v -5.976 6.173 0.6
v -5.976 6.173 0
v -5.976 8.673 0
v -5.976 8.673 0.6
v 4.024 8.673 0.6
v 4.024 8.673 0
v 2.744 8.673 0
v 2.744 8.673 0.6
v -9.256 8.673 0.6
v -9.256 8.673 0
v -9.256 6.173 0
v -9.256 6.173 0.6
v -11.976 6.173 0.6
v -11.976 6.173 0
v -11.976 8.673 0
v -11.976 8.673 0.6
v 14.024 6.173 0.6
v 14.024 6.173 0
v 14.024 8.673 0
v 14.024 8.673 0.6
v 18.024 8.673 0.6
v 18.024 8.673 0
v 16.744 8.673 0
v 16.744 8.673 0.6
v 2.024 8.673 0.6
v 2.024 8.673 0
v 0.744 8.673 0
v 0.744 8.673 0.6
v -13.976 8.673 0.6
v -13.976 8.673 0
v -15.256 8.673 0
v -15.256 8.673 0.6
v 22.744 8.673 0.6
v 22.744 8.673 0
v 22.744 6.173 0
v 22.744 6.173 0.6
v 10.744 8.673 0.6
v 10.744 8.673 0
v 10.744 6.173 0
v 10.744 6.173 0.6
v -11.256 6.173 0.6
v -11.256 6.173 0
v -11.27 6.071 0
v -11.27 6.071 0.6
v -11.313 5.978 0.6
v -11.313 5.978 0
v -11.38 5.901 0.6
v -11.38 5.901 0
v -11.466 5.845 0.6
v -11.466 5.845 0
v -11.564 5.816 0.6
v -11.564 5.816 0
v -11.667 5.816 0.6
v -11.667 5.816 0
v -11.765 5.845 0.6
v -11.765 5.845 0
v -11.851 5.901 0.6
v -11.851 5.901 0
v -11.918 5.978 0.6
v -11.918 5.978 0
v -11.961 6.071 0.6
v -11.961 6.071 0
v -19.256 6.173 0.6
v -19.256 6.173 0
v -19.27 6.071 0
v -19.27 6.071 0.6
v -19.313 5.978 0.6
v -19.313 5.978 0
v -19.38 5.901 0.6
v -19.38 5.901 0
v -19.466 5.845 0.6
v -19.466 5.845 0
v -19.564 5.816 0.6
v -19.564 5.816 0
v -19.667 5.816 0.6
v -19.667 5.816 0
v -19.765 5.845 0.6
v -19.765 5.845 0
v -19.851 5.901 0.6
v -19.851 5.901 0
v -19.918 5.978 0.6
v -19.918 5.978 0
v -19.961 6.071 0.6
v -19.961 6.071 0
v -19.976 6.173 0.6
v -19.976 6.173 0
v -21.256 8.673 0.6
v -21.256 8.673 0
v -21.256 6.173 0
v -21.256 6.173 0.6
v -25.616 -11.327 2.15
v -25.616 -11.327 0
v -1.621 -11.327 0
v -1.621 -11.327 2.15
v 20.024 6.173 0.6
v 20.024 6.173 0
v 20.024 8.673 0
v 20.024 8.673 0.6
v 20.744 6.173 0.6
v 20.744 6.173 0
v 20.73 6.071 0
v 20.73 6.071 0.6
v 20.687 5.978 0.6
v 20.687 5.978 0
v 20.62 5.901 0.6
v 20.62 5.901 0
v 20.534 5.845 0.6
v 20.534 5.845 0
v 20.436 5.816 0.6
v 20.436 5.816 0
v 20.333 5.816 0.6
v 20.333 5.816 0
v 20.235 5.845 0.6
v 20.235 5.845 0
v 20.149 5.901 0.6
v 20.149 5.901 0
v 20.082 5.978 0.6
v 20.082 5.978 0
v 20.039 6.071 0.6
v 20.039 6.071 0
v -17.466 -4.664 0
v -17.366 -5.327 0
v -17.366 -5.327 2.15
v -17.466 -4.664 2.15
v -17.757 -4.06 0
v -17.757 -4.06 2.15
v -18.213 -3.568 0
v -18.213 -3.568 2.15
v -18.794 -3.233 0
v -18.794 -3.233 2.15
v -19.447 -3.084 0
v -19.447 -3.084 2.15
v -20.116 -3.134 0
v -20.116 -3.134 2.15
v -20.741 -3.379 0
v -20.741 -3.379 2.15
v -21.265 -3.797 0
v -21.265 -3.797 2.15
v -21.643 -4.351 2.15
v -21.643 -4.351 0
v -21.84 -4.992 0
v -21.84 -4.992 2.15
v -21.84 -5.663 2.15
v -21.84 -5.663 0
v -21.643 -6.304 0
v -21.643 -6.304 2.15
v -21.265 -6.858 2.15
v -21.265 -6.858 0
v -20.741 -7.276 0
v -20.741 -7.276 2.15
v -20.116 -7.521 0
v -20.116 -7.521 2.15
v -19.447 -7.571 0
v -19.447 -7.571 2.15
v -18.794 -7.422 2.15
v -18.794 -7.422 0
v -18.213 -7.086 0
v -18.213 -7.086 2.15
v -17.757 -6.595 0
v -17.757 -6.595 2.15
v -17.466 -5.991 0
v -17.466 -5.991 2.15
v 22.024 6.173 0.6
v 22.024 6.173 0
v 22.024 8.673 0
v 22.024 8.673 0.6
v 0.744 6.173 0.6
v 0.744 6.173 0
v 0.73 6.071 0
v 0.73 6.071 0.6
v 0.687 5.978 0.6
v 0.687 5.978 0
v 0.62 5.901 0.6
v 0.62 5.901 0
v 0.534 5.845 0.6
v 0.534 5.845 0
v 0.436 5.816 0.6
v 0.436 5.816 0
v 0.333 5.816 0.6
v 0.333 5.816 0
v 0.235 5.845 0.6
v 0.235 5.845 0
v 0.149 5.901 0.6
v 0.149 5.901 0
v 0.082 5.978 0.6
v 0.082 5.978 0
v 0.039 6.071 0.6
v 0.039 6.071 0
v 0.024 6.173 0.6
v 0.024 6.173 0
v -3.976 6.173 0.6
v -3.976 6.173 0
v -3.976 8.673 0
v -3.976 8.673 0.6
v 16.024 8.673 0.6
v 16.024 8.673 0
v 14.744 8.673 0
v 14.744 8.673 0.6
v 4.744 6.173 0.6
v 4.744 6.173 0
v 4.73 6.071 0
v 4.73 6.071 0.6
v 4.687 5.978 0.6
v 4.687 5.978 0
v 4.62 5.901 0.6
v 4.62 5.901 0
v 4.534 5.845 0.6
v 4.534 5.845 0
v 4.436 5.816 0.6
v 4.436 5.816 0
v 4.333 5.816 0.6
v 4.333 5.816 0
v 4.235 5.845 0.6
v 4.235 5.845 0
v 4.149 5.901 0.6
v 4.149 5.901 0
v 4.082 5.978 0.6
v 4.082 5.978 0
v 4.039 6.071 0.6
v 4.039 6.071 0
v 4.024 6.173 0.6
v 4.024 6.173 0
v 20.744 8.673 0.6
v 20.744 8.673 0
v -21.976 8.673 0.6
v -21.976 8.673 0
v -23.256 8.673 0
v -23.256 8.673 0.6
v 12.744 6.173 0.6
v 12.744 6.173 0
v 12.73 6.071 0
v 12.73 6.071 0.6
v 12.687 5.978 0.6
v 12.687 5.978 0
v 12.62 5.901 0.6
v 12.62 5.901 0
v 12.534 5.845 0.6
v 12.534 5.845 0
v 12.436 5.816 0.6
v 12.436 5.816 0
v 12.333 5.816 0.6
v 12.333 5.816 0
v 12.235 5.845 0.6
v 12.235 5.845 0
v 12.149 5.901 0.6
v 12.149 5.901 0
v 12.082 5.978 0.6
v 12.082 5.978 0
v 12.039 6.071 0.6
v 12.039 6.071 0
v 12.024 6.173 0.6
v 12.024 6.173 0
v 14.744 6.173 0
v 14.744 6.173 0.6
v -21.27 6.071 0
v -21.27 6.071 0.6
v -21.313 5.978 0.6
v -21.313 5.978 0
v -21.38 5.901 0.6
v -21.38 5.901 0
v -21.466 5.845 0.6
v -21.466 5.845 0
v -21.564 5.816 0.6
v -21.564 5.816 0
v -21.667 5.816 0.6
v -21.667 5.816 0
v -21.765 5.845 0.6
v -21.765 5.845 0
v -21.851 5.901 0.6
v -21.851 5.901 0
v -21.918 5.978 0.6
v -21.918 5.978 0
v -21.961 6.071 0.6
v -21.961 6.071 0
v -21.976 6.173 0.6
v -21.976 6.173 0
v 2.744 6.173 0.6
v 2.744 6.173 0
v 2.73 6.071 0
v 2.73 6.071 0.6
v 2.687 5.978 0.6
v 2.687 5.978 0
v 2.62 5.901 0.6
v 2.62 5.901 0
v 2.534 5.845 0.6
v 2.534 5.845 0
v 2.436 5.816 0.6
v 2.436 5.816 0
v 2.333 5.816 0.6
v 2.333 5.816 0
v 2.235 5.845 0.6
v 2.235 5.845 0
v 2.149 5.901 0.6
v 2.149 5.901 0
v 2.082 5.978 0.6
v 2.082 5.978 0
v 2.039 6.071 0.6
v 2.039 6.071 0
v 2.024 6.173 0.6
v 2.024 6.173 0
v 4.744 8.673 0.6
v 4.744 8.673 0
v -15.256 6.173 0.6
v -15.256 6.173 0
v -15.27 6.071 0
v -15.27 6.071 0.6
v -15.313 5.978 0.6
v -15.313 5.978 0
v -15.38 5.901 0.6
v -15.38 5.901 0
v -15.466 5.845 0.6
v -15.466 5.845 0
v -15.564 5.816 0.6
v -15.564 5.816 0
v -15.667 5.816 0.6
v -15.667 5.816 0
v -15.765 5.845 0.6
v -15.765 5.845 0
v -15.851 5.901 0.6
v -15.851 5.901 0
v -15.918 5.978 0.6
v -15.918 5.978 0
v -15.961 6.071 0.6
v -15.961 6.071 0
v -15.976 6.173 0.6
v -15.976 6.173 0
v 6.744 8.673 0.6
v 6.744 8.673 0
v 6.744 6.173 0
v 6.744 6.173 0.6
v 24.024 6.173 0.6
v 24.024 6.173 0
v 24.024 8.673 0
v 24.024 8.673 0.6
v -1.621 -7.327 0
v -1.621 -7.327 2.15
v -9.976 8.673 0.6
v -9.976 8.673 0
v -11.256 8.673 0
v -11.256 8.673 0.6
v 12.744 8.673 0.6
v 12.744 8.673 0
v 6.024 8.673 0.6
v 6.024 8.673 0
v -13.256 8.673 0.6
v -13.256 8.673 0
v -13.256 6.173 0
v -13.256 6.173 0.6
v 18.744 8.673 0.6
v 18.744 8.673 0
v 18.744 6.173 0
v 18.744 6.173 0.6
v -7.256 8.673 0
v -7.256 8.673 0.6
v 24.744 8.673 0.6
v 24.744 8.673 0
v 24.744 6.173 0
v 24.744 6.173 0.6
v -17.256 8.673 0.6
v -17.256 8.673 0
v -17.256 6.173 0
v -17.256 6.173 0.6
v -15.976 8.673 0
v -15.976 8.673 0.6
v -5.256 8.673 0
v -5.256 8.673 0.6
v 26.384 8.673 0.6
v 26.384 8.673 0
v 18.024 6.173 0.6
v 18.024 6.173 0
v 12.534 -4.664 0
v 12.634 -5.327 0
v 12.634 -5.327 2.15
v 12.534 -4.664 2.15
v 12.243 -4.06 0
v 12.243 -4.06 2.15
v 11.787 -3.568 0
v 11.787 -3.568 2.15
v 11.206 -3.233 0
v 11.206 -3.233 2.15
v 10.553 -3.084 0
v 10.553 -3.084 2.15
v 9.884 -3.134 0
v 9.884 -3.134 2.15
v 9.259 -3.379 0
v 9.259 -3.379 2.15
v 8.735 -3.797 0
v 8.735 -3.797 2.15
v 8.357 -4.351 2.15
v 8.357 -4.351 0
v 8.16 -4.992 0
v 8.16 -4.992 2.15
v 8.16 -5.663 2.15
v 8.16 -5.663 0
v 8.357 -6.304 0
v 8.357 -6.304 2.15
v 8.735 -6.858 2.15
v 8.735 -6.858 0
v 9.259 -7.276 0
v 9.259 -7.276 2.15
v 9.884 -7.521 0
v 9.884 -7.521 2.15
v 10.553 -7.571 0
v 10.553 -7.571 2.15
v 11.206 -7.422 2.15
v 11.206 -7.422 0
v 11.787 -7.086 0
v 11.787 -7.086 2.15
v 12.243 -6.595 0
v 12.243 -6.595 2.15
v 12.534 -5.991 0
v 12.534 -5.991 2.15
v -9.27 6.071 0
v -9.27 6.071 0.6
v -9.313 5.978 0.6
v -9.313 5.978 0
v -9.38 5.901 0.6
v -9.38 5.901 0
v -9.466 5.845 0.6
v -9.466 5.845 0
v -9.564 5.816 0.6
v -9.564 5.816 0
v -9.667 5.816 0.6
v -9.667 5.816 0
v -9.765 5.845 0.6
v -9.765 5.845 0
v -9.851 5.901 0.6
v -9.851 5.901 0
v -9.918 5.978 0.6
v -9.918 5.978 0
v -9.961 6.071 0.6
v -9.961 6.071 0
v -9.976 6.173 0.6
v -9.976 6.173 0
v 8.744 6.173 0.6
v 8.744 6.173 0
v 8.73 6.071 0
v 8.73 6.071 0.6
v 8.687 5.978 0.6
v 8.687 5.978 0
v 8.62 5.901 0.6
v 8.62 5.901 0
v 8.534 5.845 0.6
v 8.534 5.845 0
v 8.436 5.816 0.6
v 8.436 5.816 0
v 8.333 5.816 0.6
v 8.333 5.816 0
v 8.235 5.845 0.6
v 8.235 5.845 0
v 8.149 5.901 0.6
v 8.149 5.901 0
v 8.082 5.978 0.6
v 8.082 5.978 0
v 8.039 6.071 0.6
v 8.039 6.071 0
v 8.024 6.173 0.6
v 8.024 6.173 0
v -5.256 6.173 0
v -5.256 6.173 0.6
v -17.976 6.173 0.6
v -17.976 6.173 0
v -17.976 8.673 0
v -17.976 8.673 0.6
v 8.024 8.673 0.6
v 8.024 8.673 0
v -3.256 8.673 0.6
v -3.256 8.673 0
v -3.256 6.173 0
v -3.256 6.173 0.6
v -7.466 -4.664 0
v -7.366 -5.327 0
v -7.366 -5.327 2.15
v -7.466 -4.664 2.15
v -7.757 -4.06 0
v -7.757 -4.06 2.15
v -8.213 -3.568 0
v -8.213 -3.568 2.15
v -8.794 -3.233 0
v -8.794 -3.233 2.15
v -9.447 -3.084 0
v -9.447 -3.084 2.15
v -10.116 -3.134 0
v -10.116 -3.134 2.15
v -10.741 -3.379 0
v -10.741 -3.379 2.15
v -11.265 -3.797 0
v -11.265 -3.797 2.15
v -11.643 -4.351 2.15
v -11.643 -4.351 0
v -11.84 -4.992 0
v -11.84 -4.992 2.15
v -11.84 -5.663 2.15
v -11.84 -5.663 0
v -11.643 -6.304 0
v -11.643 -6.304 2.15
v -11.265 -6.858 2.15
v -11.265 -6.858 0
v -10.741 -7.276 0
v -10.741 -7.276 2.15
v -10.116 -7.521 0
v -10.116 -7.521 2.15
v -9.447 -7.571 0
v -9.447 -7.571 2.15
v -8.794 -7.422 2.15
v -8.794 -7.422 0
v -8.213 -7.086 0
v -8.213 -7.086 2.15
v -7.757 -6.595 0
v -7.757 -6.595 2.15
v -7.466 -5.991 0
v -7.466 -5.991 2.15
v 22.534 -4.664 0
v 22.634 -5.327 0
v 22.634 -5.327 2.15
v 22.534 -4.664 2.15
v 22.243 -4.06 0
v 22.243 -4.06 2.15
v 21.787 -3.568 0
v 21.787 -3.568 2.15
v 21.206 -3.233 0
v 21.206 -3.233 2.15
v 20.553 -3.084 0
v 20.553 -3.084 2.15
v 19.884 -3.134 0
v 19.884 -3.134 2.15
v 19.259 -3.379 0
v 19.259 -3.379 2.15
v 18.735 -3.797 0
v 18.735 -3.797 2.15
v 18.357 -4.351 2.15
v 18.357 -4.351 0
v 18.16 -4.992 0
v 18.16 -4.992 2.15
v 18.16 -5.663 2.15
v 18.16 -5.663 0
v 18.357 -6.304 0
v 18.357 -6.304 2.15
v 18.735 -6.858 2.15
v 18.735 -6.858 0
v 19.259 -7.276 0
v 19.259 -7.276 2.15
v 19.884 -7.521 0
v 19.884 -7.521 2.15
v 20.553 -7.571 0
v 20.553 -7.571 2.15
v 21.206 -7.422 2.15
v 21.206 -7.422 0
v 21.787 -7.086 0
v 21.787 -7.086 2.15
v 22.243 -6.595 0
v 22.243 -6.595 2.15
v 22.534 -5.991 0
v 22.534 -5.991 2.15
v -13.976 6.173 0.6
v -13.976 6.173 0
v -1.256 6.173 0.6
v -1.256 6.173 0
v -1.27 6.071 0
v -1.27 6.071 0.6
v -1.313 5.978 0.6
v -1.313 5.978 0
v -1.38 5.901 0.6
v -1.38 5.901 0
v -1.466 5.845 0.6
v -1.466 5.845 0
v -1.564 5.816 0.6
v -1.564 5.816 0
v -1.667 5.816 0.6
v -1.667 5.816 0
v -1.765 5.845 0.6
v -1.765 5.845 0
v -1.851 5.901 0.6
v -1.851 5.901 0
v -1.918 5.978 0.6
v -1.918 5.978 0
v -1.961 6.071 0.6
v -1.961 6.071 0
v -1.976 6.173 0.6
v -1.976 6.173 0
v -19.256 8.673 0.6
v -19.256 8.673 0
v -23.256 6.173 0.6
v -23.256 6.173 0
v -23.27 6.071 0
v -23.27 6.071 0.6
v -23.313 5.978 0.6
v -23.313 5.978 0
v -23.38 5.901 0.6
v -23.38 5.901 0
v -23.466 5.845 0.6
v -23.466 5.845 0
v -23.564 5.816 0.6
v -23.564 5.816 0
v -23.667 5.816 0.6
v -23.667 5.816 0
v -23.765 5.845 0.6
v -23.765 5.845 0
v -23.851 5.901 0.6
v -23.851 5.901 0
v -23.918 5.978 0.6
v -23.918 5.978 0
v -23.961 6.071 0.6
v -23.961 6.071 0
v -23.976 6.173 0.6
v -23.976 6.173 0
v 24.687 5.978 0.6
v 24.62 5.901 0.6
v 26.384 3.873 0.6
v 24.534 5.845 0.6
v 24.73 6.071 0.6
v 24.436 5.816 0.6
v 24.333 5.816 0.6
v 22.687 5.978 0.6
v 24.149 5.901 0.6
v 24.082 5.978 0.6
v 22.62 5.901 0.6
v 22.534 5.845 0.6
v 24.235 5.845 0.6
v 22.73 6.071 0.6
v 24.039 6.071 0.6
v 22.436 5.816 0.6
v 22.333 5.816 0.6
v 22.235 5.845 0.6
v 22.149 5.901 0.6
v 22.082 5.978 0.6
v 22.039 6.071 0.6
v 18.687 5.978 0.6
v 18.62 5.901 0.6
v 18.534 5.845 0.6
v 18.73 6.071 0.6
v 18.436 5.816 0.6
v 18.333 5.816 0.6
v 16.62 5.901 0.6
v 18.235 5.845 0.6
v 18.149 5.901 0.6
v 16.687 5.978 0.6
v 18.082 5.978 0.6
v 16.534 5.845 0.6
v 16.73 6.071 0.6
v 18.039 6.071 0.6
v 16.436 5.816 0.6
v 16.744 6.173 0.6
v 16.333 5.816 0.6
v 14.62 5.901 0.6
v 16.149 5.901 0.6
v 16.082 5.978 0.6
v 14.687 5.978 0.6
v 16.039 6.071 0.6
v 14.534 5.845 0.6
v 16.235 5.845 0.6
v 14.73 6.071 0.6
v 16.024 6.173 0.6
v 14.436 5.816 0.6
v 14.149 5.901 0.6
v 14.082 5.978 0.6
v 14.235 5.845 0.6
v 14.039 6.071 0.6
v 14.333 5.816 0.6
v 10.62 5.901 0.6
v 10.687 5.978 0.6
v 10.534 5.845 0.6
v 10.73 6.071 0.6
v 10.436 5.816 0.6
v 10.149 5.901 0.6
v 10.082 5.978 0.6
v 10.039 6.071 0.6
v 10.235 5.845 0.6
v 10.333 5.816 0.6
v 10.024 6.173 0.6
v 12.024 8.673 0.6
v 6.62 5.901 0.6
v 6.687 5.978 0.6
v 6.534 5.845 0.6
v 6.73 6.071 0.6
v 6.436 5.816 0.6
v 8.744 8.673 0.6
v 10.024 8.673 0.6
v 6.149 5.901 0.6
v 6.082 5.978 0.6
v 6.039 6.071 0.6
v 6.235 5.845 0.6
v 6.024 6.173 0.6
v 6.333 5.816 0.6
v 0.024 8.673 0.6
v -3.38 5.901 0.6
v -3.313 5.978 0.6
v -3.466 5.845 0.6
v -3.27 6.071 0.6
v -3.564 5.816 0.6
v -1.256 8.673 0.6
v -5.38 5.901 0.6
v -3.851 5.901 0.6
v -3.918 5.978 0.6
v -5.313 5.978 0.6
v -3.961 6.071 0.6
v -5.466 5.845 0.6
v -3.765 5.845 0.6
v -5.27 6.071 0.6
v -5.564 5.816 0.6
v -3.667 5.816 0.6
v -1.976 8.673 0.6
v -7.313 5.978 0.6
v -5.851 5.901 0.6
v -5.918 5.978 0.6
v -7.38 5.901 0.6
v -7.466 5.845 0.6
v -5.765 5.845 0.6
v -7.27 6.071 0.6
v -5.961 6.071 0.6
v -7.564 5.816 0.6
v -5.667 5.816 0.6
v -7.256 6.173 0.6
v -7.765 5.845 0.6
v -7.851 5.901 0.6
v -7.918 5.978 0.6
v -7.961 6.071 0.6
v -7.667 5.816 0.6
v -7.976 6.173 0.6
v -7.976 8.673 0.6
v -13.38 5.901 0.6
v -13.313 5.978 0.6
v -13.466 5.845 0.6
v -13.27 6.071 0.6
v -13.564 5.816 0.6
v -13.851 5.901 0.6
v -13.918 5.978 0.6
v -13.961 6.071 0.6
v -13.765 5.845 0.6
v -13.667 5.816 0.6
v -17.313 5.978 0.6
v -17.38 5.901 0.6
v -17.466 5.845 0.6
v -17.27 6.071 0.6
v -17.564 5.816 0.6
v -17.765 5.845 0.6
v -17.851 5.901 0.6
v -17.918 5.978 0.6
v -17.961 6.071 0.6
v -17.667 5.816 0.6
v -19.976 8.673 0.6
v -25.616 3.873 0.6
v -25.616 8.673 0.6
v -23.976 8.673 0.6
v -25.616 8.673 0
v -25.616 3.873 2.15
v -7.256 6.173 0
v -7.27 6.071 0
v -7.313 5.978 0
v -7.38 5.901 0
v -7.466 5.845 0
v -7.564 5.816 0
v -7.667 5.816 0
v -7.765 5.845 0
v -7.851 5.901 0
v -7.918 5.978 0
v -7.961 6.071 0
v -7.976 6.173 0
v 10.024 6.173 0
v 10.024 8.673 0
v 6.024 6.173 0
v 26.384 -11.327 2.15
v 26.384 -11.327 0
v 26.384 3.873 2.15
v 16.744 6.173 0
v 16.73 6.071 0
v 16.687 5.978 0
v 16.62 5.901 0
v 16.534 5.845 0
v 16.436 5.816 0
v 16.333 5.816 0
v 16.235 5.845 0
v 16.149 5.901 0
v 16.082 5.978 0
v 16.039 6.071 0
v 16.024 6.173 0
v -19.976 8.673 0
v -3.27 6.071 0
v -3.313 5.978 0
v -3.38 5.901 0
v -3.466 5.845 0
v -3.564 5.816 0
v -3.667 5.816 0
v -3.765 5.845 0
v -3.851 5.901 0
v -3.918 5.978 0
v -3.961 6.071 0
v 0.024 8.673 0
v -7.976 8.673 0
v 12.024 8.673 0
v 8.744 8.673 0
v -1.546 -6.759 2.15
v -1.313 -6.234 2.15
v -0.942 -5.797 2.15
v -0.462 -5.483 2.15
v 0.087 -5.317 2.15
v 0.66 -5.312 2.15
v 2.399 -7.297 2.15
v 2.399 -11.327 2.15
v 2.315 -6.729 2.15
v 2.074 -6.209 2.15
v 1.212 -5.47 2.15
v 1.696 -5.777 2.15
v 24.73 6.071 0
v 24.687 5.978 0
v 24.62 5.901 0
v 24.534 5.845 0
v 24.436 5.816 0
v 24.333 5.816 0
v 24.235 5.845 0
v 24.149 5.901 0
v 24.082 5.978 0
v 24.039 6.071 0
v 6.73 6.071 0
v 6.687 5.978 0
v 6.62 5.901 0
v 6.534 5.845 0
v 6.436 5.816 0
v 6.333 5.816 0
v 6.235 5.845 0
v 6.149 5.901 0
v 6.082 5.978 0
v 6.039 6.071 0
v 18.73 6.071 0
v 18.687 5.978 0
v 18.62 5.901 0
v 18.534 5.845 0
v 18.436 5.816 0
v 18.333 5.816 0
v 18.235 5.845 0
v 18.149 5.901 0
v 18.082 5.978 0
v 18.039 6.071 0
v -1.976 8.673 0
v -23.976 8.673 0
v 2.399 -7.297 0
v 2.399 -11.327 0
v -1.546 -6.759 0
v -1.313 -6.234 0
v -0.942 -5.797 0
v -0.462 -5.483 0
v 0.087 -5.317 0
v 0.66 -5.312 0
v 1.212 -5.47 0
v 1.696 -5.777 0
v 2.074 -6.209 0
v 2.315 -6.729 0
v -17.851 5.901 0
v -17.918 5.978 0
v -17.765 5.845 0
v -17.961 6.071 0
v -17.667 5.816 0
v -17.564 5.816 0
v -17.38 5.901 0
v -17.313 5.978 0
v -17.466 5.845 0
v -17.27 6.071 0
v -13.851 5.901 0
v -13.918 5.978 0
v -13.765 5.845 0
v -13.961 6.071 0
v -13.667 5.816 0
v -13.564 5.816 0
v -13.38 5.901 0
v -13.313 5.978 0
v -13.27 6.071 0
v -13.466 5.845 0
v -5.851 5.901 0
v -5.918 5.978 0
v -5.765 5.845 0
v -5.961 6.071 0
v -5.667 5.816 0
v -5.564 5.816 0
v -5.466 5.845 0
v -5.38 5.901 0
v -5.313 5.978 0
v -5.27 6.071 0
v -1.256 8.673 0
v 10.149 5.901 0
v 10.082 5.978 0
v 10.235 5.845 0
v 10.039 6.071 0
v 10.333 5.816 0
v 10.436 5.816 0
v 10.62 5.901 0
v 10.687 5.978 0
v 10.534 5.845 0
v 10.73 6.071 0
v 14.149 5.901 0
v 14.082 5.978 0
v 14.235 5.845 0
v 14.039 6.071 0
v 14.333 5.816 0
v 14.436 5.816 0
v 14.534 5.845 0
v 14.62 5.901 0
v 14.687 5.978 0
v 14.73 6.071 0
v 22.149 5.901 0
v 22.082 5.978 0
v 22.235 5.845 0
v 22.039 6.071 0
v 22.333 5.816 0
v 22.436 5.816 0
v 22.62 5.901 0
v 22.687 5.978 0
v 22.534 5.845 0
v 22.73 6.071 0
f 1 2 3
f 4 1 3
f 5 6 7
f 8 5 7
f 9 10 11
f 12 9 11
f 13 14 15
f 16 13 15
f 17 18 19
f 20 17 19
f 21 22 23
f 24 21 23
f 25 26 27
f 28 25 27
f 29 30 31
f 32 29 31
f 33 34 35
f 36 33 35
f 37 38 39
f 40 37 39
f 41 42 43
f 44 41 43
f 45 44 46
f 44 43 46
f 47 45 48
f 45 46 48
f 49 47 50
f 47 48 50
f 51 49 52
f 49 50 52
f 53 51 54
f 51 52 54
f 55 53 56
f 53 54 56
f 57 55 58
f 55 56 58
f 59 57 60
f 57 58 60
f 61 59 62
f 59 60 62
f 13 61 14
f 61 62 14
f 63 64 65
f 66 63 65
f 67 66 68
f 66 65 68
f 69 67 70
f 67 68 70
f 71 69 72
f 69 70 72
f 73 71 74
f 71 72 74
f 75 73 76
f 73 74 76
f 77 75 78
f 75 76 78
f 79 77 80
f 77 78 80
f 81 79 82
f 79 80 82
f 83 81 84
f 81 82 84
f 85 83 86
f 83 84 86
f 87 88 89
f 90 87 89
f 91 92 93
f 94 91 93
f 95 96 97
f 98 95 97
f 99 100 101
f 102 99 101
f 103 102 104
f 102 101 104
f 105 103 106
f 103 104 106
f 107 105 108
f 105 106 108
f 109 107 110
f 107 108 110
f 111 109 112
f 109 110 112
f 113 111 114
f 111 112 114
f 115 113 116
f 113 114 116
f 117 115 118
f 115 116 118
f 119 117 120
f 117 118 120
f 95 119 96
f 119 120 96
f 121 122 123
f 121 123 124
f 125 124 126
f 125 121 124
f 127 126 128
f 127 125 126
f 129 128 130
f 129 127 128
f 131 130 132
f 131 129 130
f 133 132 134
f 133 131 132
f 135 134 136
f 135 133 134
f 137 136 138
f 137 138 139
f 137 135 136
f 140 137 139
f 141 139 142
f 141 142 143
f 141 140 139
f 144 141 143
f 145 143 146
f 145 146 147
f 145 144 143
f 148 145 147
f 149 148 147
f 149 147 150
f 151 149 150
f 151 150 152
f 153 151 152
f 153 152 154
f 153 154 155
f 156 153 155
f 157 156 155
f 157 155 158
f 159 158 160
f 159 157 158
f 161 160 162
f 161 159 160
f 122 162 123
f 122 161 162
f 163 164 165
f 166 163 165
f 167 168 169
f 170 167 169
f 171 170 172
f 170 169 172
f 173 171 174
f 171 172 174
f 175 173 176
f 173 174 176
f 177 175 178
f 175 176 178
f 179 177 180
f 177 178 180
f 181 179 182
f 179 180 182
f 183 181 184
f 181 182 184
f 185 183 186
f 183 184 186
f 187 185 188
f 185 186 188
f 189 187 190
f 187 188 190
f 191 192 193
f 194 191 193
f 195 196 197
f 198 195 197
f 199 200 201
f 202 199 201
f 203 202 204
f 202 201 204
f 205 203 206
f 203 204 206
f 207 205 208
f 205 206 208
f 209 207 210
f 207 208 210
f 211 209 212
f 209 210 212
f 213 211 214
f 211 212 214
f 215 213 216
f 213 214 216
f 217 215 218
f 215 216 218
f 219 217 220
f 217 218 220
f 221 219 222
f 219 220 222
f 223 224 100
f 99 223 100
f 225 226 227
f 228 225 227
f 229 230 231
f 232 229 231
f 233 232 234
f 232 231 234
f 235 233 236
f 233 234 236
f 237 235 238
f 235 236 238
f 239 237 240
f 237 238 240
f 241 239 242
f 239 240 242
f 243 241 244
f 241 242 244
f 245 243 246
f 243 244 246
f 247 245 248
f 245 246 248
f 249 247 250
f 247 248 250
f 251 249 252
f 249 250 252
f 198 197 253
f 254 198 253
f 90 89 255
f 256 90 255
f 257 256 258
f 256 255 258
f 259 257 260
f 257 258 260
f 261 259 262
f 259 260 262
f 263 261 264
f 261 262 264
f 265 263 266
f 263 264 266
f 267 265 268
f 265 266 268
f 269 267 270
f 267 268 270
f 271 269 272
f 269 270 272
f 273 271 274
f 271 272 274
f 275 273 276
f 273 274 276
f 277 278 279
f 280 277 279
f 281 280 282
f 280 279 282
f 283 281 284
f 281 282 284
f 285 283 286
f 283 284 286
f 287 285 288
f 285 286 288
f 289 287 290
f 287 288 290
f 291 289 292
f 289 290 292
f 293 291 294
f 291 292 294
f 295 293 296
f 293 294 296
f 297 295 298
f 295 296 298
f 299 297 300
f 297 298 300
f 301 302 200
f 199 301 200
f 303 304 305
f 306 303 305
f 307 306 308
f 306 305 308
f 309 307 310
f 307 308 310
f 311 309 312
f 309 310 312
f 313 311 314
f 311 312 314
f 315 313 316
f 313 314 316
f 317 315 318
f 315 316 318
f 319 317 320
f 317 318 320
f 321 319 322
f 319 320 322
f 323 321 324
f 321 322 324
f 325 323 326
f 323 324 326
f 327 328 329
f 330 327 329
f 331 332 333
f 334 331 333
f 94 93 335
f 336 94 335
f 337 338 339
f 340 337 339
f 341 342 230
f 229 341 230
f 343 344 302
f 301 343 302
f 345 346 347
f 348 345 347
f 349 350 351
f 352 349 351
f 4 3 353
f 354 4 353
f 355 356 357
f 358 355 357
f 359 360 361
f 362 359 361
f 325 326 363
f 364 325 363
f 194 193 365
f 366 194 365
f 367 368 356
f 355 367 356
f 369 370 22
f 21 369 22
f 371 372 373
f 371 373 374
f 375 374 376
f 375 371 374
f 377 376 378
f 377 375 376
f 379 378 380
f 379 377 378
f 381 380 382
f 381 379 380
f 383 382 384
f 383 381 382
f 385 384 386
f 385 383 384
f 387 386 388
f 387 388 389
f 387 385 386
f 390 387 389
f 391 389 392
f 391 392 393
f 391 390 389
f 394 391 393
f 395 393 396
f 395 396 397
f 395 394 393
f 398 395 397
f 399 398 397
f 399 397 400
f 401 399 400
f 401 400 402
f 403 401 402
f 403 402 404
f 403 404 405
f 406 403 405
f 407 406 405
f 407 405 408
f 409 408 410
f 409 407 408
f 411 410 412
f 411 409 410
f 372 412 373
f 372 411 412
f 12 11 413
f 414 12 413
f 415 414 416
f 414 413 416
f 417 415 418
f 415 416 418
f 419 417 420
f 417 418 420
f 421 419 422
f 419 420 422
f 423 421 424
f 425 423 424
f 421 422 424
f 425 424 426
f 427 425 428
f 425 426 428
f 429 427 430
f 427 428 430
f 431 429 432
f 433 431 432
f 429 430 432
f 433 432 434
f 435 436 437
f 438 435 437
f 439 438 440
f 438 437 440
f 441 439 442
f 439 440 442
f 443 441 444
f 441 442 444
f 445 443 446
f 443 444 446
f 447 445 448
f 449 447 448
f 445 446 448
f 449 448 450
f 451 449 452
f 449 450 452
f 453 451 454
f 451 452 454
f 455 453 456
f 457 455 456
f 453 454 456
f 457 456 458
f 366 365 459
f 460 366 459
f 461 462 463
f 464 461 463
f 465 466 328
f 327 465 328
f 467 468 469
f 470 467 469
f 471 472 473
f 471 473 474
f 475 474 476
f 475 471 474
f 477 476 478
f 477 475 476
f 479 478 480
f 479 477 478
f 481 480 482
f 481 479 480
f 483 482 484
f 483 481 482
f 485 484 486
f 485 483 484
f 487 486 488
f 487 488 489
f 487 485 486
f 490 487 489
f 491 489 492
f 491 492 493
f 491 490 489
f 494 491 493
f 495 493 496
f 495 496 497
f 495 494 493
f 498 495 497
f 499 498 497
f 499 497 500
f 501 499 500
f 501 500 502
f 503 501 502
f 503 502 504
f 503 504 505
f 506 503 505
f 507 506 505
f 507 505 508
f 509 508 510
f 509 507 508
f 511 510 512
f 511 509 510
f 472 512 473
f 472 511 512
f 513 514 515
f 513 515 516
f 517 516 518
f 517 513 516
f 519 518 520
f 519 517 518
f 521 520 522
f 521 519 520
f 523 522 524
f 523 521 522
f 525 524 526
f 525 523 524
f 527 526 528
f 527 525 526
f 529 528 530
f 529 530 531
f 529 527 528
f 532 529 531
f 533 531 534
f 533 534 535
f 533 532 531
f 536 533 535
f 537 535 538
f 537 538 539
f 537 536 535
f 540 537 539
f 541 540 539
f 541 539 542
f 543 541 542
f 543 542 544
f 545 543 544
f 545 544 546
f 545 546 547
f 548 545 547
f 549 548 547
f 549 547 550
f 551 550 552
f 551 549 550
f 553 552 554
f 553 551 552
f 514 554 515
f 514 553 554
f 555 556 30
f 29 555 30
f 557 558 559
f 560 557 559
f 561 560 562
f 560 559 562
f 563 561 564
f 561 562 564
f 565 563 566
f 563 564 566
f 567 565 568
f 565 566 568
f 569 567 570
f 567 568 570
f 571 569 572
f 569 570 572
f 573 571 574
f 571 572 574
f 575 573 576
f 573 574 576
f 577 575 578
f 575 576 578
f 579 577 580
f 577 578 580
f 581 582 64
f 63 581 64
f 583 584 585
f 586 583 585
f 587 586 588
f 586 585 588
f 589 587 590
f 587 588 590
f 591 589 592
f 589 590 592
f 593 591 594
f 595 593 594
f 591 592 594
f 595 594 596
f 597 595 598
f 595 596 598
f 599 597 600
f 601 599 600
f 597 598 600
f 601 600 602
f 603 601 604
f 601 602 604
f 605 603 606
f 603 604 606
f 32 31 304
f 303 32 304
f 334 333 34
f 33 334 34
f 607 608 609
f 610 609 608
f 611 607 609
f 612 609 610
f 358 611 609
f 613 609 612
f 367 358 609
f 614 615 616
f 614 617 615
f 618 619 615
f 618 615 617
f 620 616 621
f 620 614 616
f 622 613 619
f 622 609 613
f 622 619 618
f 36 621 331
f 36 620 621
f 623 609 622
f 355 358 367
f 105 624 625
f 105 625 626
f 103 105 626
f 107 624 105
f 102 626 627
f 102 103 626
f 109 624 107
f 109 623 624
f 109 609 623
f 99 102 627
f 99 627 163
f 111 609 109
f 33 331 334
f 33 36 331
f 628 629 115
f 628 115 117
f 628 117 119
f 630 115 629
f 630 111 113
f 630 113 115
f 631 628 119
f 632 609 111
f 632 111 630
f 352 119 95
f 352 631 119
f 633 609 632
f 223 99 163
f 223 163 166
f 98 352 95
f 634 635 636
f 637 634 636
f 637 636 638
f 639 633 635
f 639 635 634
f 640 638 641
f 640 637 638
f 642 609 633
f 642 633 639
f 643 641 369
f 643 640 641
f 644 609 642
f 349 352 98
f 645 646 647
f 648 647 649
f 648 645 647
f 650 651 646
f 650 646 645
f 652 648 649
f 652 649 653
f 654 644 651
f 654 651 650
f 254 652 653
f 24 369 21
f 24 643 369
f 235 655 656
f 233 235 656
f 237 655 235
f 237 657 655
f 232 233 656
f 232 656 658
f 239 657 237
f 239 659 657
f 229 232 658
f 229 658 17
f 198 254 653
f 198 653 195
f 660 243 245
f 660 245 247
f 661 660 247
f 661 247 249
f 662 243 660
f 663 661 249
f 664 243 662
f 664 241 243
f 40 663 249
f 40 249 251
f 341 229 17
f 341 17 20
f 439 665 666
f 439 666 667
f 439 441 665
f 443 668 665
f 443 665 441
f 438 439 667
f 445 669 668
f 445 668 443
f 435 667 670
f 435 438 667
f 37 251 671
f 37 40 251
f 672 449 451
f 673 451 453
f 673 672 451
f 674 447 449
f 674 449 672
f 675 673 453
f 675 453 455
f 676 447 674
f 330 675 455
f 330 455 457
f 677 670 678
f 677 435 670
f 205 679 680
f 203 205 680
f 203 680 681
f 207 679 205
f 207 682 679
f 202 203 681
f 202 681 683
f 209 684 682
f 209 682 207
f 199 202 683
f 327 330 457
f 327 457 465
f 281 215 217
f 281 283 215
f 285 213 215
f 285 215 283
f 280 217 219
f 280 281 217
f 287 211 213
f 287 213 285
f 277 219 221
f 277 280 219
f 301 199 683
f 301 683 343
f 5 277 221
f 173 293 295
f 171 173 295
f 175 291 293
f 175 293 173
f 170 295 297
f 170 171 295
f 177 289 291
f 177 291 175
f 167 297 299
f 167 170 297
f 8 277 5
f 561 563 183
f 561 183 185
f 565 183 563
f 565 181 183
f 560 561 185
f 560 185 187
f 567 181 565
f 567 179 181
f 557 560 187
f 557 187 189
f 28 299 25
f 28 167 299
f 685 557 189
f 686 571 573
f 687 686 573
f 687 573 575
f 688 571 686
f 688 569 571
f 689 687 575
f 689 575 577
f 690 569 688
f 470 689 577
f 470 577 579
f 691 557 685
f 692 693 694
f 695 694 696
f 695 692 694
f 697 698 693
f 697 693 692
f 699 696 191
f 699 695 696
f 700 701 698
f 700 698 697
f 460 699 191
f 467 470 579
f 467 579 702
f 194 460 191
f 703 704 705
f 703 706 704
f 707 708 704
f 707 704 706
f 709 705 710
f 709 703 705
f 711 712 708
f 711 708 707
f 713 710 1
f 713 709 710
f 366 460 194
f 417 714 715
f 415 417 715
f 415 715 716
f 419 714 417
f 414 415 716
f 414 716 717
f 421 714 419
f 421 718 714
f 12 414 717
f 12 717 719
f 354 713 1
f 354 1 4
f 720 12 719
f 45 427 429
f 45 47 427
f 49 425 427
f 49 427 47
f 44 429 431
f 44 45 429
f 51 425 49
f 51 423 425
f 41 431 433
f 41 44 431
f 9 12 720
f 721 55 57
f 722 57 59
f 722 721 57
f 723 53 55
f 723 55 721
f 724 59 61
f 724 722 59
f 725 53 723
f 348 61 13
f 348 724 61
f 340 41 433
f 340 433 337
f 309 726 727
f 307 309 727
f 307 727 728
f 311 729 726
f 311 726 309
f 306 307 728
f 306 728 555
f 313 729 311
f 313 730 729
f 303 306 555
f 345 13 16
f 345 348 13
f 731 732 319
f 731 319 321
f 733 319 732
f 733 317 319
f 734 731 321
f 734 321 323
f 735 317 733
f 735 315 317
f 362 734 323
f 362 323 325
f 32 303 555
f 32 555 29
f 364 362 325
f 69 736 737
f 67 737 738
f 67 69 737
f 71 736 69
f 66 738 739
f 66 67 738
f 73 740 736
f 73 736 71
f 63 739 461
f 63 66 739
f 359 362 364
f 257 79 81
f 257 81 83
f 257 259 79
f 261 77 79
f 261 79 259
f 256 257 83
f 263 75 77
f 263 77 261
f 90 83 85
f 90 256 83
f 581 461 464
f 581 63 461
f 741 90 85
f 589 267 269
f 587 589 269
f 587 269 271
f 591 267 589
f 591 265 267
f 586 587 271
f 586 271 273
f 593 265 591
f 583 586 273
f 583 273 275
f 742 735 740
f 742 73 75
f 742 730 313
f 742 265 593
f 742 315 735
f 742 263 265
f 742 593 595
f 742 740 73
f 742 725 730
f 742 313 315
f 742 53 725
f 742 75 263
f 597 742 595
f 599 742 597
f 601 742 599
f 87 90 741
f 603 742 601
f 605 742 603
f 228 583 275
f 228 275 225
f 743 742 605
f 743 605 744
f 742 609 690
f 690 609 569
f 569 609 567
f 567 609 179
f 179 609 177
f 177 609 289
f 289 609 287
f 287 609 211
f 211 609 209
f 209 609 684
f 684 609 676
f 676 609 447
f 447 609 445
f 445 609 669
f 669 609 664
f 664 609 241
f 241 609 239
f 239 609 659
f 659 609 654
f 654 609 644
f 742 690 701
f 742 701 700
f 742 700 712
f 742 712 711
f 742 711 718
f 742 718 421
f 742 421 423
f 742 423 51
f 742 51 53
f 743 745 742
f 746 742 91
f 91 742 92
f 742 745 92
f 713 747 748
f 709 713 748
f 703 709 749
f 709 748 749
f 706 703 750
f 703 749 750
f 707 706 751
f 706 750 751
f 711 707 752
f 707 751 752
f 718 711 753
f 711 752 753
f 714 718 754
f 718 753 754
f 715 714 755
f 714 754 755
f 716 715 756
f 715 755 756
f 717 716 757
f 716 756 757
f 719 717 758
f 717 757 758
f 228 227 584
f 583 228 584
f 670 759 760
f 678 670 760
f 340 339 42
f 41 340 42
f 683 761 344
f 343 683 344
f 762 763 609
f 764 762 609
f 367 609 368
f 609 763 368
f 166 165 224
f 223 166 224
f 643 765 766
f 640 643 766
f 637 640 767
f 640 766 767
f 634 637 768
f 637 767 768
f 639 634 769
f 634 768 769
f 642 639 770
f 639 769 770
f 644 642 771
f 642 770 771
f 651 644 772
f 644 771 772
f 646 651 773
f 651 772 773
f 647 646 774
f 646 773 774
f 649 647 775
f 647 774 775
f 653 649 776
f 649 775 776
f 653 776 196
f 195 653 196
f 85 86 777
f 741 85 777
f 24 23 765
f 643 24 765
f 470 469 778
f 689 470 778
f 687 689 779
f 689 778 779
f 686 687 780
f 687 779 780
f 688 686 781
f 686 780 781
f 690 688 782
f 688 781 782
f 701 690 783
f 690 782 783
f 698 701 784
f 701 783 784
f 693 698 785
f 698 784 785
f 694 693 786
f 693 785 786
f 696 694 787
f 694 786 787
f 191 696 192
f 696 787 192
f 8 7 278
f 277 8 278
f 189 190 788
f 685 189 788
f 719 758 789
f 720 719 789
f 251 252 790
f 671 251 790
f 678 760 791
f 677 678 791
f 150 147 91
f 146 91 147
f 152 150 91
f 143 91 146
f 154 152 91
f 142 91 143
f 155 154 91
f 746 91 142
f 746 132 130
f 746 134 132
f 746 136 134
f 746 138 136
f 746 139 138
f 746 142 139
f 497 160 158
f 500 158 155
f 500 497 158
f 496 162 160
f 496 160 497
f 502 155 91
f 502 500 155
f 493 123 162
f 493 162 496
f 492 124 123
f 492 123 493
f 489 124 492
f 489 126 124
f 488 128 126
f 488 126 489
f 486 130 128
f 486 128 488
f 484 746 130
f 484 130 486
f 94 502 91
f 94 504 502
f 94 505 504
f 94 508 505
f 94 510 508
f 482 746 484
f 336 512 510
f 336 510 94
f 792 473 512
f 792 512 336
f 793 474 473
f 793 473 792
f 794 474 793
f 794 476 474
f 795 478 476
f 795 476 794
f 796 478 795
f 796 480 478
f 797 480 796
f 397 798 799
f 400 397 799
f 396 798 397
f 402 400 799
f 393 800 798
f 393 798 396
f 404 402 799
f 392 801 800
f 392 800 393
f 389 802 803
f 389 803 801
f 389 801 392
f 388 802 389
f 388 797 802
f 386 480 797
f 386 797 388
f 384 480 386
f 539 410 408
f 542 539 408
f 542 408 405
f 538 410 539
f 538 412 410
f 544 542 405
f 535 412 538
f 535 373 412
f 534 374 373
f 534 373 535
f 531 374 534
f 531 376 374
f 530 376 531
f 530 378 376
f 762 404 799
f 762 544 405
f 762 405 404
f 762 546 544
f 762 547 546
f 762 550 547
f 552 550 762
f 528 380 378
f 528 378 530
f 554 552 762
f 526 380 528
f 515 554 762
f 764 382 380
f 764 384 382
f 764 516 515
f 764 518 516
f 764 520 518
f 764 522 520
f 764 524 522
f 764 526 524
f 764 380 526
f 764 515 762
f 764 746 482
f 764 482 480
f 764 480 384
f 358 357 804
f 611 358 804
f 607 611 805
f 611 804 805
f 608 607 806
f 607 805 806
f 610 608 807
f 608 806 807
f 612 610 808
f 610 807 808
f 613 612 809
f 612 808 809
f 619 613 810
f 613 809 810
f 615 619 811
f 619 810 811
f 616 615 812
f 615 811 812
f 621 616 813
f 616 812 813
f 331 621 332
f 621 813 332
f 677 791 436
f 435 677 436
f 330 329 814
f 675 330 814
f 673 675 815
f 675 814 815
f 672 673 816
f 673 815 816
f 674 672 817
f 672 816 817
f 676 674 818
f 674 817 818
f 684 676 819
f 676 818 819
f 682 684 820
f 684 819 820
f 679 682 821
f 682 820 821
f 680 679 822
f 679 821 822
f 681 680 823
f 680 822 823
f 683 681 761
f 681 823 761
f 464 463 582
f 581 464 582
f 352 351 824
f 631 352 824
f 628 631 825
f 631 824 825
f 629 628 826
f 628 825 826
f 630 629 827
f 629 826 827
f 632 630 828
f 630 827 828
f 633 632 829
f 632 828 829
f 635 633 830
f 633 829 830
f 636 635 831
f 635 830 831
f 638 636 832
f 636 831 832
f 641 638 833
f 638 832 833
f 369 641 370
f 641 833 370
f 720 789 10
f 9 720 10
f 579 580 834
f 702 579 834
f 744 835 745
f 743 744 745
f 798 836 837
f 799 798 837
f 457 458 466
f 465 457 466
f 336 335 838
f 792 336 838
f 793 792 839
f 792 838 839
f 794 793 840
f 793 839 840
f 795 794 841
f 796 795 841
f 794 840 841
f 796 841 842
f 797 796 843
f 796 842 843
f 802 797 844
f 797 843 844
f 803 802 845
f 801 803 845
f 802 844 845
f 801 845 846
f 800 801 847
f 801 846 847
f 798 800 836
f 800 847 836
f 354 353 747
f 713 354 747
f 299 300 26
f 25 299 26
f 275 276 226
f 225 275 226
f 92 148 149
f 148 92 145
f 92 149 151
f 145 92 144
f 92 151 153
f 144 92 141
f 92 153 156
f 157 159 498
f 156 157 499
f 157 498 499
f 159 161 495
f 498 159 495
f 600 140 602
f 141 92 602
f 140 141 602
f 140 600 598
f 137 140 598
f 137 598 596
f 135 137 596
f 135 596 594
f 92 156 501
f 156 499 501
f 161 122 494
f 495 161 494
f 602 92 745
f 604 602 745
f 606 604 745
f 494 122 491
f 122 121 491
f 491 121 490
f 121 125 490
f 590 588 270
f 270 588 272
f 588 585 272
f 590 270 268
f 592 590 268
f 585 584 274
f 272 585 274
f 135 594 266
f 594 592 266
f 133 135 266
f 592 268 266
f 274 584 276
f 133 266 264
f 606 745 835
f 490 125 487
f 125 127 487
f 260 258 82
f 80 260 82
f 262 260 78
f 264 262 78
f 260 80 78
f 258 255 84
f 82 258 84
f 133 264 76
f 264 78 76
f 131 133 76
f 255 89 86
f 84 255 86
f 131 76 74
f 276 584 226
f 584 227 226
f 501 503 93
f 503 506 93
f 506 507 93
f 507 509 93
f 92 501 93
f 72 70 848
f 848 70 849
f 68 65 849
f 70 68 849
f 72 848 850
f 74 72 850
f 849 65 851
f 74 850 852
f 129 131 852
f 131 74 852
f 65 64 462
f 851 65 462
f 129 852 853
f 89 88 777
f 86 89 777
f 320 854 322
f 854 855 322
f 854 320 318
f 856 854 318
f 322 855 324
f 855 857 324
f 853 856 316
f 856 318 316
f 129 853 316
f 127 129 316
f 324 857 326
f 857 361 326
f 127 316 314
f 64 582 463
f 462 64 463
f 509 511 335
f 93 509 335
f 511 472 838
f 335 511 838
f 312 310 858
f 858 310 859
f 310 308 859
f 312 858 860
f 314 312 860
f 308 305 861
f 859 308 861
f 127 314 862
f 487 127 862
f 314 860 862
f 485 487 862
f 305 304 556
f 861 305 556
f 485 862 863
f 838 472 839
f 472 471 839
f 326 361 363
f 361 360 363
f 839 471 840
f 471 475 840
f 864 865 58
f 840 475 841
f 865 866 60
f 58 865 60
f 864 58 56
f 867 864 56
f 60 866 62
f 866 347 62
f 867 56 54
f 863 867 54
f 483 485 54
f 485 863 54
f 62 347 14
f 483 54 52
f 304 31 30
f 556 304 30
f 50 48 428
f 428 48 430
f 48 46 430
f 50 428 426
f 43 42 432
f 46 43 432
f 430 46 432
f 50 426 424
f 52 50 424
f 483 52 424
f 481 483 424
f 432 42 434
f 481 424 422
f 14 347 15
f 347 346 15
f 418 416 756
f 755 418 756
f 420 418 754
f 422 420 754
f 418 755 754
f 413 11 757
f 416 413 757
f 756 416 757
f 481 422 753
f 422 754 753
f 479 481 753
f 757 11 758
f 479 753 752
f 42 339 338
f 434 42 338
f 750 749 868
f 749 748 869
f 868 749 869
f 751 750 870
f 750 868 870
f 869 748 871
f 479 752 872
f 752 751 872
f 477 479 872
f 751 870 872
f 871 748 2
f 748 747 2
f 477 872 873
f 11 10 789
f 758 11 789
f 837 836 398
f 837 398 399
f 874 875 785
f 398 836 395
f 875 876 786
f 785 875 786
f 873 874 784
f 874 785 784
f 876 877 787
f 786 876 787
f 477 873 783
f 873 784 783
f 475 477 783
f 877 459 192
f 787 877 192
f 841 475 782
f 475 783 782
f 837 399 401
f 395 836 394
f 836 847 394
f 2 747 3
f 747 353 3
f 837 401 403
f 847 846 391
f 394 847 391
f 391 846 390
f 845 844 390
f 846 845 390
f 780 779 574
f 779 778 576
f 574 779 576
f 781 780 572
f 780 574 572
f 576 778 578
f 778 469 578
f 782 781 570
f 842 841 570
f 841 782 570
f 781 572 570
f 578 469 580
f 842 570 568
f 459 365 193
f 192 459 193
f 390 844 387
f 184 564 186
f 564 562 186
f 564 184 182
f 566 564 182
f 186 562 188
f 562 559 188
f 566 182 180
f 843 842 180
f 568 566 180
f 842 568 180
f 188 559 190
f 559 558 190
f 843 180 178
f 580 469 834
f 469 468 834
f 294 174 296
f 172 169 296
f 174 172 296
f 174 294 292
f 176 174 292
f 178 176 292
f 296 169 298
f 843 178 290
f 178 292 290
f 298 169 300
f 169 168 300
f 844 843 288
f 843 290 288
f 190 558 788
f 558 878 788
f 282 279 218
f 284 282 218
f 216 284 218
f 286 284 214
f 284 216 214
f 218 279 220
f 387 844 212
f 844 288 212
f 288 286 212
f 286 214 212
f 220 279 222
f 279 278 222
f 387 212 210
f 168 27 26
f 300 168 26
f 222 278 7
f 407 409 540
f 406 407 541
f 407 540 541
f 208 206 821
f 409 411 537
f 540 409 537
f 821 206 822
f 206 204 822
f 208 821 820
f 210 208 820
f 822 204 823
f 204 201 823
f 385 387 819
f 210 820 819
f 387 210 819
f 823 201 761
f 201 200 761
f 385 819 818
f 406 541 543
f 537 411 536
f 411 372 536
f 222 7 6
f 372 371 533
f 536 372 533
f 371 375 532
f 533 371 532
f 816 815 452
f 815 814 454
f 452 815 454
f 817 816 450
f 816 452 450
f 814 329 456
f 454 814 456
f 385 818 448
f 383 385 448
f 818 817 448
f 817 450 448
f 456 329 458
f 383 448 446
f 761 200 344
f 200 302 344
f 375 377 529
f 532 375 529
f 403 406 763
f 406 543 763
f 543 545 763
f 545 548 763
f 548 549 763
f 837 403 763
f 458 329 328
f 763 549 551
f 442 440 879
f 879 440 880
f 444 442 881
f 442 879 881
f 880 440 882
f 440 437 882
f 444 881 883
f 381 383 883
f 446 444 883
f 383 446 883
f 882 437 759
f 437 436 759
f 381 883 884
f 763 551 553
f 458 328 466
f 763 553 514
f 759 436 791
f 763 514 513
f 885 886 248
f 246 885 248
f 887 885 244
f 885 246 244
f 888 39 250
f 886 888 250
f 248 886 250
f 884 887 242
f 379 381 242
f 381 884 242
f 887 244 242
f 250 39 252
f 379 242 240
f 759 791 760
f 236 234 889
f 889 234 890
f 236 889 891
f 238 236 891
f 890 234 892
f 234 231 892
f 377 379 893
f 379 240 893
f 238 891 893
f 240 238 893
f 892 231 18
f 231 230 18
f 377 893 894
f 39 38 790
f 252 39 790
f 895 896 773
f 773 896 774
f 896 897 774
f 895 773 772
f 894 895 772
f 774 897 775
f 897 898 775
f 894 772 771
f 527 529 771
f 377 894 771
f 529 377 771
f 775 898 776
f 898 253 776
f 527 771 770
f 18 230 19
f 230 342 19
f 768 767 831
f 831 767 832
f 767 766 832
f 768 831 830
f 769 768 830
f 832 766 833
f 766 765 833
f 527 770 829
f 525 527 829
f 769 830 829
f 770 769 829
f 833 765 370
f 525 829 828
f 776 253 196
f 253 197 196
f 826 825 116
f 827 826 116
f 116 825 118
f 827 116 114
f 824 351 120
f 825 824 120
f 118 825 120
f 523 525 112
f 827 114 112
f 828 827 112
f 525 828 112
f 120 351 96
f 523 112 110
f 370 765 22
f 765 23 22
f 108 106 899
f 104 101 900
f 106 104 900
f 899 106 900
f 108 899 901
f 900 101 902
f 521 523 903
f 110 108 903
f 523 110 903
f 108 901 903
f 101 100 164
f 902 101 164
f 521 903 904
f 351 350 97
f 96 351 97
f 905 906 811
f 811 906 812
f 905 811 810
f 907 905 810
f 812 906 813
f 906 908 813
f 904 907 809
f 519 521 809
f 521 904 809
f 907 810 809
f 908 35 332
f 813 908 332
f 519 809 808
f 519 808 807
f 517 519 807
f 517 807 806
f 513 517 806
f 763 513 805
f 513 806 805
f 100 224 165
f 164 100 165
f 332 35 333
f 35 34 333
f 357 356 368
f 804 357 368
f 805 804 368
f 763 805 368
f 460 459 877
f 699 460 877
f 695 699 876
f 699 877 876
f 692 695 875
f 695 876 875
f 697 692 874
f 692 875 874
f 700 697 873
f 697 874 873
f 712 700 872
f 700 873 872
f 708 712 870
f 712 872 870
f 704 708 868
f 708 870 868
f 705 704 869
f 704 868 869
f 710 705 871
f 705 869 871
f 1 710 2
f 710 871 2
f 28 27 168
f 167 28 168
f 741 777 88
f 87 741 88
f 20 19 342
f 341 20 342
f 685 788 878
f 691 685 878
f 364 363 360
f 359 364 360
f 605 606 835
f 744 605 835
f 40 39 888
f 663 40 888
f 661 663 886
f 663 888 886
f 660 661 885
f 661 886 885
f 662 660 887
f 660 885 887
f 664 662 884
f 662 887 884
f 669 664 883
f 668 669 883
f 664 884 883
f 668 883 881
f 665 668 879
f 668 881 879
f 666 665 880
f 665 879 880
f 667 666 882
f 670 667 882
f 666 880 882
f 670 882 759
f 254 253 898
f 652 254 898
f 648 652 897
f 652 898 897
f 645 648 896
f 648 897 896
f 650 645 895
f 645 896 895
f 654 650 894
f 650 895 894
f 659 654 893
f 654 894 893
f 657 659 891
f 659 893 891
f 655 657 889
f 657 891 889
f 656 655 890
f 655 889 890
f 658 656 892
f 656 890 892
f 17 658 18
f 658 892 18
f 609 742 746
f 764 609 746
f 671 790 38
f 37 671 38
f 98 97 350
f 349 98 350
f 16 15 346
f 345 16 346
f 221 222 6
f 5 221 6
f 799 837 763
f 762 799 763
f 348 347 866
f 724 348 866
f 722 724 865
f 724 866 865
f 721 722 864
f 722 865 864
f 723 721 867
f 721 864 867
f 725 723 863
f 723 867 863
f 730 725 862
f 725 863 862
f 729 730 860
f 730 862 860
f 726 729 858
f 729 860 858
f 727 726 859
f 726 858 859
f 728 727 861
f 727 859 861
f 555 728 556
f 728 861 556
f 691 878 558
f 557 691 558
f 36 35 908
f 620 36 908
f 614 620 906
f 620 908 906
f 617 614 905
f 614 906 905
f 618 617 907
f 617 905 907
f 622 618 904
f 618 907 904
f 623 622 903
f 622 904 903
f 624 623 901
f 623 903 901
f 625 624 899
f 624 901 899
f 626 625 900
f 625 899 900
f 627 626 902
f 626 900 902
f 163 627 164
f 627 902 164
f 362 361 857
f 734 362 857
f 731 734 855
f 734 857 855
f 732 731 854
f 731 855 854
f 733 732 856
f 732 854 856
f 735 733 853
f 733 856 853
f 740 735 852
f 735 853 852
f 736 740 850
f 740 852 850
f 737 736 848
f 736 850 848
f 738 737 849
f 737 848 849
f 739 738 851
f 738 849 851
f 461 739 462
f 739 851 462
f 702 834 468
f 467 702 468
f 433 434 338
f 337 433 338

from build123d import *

# Parameters (mm, degrees)
SKETCH1_R           = 2.25
BOSS_EXTRUDE1_DEPTH = 2.15
SKETCH2_W           = 1.55
SKETCH2_H           = 4.8
CUT_EXTRUDE1_DEPTH  = 53


with BuildPart() as part:
    # Sketch1 → Boss-Extrude1 (new body)
    with BuildSketch(Plane.XY):
        with BuildLine():
            Line((2.398752887, -11.327345722), (26.384379929, -11.327345722))
            Line((26.384379929, -11.327345722), (26.384379929, 8.672654278))
            Line((26.384379929, 8.672654278), (26.024379959, 8.672654278))
            Line((26.024379959, 8.672654278), (24.744379959, 8.672654278))
            Line((24.744379959, 8.672654278), (24.744379959, 6.172654278))
            ThreePointArc((24.744379959, 6.172654278), (24.384379958, 5.812654278), (24.024379958, 6.172654278))
            Line((24.024379958, 6.172654278), (24.024379958, 8.672654278))
            Line((24.024379958, 8.672654278), (22.744379958, 8.672654278))
            Line((22.744379958, 8.672654278), (22.744379958, 6.172654278))
            ThreePointArc((22.744379958, 6.172654278), (22.384379957, 5.812654278), (22.024379957, 6.172654278))
            Line((22.024379957, 6.172654278), (22.024379957, 8.672654278))
            Line((22.024379957, 8.672654278), (20.744379957, 8.672654278))
            Line((20.744379957, 8.672654278), (20.744379957, 6.172654278))
            ThreePointArc((20.744379957, 6.172654278), (20.384379956, 5.812654278), (20.024379956, 6.172654278))
            Line((20.024379956, 6.172654278), (20.024379956, 8.672654278))
            Line((20.024379956, 8.672654278), (18.744379956, 8.672654278))
            Line((18.744379956, 8.672654278), (18.744379956, 6.172654278))
            ThreePointArc((18.744379956, 6.172654278), (18.384379955, 5.812654278), (18.024379955, 6.172654278))
            Line((18.024379955, 6.172654278), (18.024379955, 8.672654278))
            Line((18.024379955, 8.672654278), (16.744379955, 8.672654278))
            Line((16.744379955, 8.672654278), (16.744379955, 6.172654278))
            ThreePointArc((16.744379955, 6.172654278), (16.384379953, 5.812654278), (16.024379953, 6.172654278))
            Line((16.024379953, 6.172654278), (16.024379953, 8.672654278))
            Line((16.024379953, 8.672654278), (14.744379953, 8.672654278))
            Line((14.744379953, 8.672654278), (14.744379953, 6.172654278))
            ThreePointArc((14.744379953, 6.172654278), (14.384379952, 5.812654278), (14.024379952, 6.172654278))
            Line((14.024379952, 6.172654278), (14.024379952, 8.672654278))
            Line((14.024379952, 8.672654278), (12.744379952, 8.672654278))
            Line((12.744379952, 8.672654278), (12.744379952, 6.172654278))
            ThreePointArc((12.744379952, 6.172654278), (12.384379951, 5.812654278), (12.024379951, 6.172654278))
            Line((12.024379951, 6.172654278), (12.024379951, 8.672654278))
            Line((12.024379951, 8.672654278), (10.744379951, 8.672654278))
            Line((10.744379951, 8.672654278), (10.744379951, 6.172654278))
            ThreePointArc((10.744379951, 6.172654278), (10.38437995, 5.812654278), (10.02437995, 6.172654278))
            Line((10.02437995, 6.172654278), (10.02437995, 8.672654278))
            Line((10.02437995, 8.672654278), (8.74437995, 8.672654278))
            Line((8.74437995, 8.672654278), (8.74437995, 6.172654278))
            ThreePointArc((8.74437995, 6.172654278), (8.384379949, 5.812654278), (8.024379949, 6.172654278))
            Line((8.024379949, 6.172654278), (8.024379949, 8.672654278))
            Line((8.024379949, 8.672654278), (6.744379949, 8.672654278))
            Line((6.744379949, 8.672654278), (6.744379949, 6.172654278))
            ThreePointArc((6.744379949, 6.172654278), (6.384379947, 5.812654278), (6.024379947, 6.172654278))
            Line((6.024379947, 6.172654278), (6.024379947, 8.672654278))
            Line((6.024379947, 8.672654278), (4.744379947, 8.672654278))
            Line((4.744379947, 8.672654278), (4.744379947, 6.172654278))
            ThreePointArc((4.744379947, 6.172654278), (4.384379946, 5.812654278), (4.024379946, 6.172654278))
            Line((4.024379946, 6.172654278), (4.024379946, 8.672654278))
            Line((4.024379946, 8.672654278), (2.744379946, 8.672654278))
            Line((2.744379946, 8.672654278), (2.744379946, 6.172654278))
            ThreePointArc((2.744379946, 6.172654278), (2.384379945, 5.812654278), (2.024379945, 6.172654278))
            Line((2.024379945, 6.172654278), (2.024379945, 8.672654278))
            Line((2.024379945, 8.672654278), (0.744379945, 8.672654278))
            Line((0.744379945, 8.672654278), (0.744379945, 6.172654278))
            ThreePointArc((0.744379945, 6.172654278), (0.384379944, 5.812654278), (0.024379944, 6.172654278))
            Line((0.024379944, 6.172654278), (0.024379944, 8.672654278))
            Line((0.024379944, 8.672654278), (-1.255620056, 8.672654278))
            Line((-1.255620056, 8.672654278), (-1.255620056, 6.172654278))
            ThreePointArc((-1.255620056, 6.172654278), (-1.615620057, 5.812654278), (-1.975620057, 6.172654278))
            Line((-1.975620057, 6.172654278), (-1.975620057, 8.672654278))
            Line((-1.975620057, 8.672654278), (-3.255620057, 8.672654278))
            Line((-3.255620057, 8.672654278), (-3.255620057, 6.172654278))
            ThreePointArc((-3.255620057, 6.172654278), (-3.615620059, 5.812654278), (-3.975620059, 6.172654278))
            Line((-3.975620059, 6.172654278), (-3.975620059, 8.672654278))
            Line((-3.975620059, 8.672654278), (-5.255620059, 8.672654278))
            Line((-5.255620059, 8.672654278), (-5.255620059, 6.172654278))
            ThreePointArc((-5.255620059, 6.172654278), (-5.61562006, 5.812654278), (-5.97562006, 6.172654278))
            Line((-5.97562006, 6.172654278), (-5.97562006, 8.672654278))
            Line((-5.97562006, 8.672654278), (-7.25562006, 8.672654278))
            Line((-7.25562006, 8.672654278), (-7.25562006, 6.172654278))
            ThreePointArc((-7.25562006, 6.172654278), (-7.615620061, 5.812654278), (-7.975620061, 6.172654278))
            Line((-7.975620061, 6.172654278), (-7.975620061, 8.672654278))
            Line((-7.975620061, 8.672654278), (-9.255620061, 8.672654278))
            Line((-9.255620061, 8.672654278), (-9.255620061, 6.172654278))
            ThreePointArc((-9.255620061, 6.172654278), (-9.615620062, 5.812654278), (-9.975620062, 6.172654278))
            Line((-9.975620062, 6.172654278), (-9.975620062, 8.672654278))
            Line((-9.975620062, 8.672654278), (-11.255620062, 8.672654278))
            Line((-11.255620062, 8.672654278), (-11.255620062, 6.172654278))
            ThreePointArc((-11.255620062, 6.172654278), (-11.615620063, 5.812654278), (-11.975620063, 6.172654278))
            Line((-11.975620063, 6.172654278), (-11.975620063, 8.672654278))
            Line((-11.975620063, 8.672654278), (-13.255620063, 8.672654278))
            Line((-13.255620063, 8.672654278), (-13.255620063, 6.172654278))
            ThreePointArc((-13.255620063, 6.172654278), (-13.615620065, 5.812654278), (-13.975620065, 6.172654278))
            Line((-13.975620065, 6.172654278), (-13.975620065, 8.672654278))
            Line((-13.975620065, 8.672654278), (-15.255620065, 8.672654278))
            Line((-15.255620065, 8.672654278), (-15.255620065, 6.172654278))
            ThreePointArc((-15.255620065, 6.172654278), (-15.615620066, 5.812654278), (-15.975620066, 6.172654278))
            Line((-15.975620066, 6.172654278), (-15.975620066, 8.672654278))
            Line((-15.975620066, 8.672654278), (-17.255620066, 8.672654278))
            Line((-17.255620066, 8.672654278), (-17.255620066, 6.172654278))
            ThreePointArc((-17.255620066, 6.172654278), (-17.615620067, 5.812654278), (-17.975620067, 6.172654278))
            Line((-17.975620067, 6.172654278), (-17.975620067, 8.672654278))
            Line((-17.975620067, 8.672654278), (-19.255620067, 8.672654278))
            Line((-19.255620067, 8.672654278), (-19.255620067, 6.172654278))
            ThreePointArc((-19.255620067, 6.172654278), (-19.615620068, 5.812654278), (-19.975620068, 6.172654278))
            Line((-19.975620068, 6.172654278), (-19.975620068, 8.672654278))
            Line((-19.975620068, 8.672654278), (-21.255620068, 8.672654278))
            Line((-21.255620068, 8.672654278), (-21.255620068, 6.172654278))
            ThreePointArc((-21.255620068, 6.172654278), (-21.615620069, 5.812654278), (-21.975620069, 6.172654278))
            Line((-21.975620069, 6.172654278), (-21.975620069, 8.672654278))
            Line((-21.975620069, 8.672654278), (-23.255620069, 8.672654278))
            Line((-23.255620069, 8.672654278), (-23.255620069, 6.172654278))
            ThreePointArc((-23.255620069, 6.172654278), (-23.615620071, 5.812654278), (-23.975620071, 6.172654278))
            Line((-23.975620071, 6.172654278), (-23.975620071, 8.672654278))
            Line((-23.975620071, 8.672654278), (-25.615620071, 8.672654278))
            Line((-25.615620071, 8.672654278), (-25.615620071, -11.327345722))
            Line((-25.615620071, -11.327345722), (-1.621247113, -11.327345722))
            Line((-1.621247113, -11.327345722), (-1.621247113, -7.327345722))
            ThreePointArc((-1.621247113, -7.327345722), (0.373417474, -5.293808364), (2.398752887, -7.296800492))
            Line((2.398752887, -7.296800492), (2.398752887, -11.327345722))
        make_face()
        with Locations((-19.615620071, -5.327345722)):
            Circle(SKETCH1_R, mode=Mode.SUBTRACT)
        with Locations((-9.615620071, -5.327345722)):
            Circle(SKETCH1_R, mode=Mode.SUBTRACT)
        with Locations((10.384379929, -5.327345722)):
            Circle(SKETCH1_R, mode=Mode.SUBTRACT)
        with Locations((20.384379929, -5.327345722)):
            Circle(SKETCH1_R, mode=Mode.SUBTRACT)
    extrude(amount=BOSS_EXTRUDE1_DEPTH)

    # Sketch2 → Cut-Extrude1 (cut, through all)
    with BuildSketch(Plane.ZY.offset(25.615620071)):
        with Locations((1.375, 6.272654278)):
            Rectangle(SKETCH2_W, SKETCH2_H)
    extrude(amount=-CUT_EXTRUDE1_DEPTH, mode=Mode.SUBTRACT)


solid = part.part
